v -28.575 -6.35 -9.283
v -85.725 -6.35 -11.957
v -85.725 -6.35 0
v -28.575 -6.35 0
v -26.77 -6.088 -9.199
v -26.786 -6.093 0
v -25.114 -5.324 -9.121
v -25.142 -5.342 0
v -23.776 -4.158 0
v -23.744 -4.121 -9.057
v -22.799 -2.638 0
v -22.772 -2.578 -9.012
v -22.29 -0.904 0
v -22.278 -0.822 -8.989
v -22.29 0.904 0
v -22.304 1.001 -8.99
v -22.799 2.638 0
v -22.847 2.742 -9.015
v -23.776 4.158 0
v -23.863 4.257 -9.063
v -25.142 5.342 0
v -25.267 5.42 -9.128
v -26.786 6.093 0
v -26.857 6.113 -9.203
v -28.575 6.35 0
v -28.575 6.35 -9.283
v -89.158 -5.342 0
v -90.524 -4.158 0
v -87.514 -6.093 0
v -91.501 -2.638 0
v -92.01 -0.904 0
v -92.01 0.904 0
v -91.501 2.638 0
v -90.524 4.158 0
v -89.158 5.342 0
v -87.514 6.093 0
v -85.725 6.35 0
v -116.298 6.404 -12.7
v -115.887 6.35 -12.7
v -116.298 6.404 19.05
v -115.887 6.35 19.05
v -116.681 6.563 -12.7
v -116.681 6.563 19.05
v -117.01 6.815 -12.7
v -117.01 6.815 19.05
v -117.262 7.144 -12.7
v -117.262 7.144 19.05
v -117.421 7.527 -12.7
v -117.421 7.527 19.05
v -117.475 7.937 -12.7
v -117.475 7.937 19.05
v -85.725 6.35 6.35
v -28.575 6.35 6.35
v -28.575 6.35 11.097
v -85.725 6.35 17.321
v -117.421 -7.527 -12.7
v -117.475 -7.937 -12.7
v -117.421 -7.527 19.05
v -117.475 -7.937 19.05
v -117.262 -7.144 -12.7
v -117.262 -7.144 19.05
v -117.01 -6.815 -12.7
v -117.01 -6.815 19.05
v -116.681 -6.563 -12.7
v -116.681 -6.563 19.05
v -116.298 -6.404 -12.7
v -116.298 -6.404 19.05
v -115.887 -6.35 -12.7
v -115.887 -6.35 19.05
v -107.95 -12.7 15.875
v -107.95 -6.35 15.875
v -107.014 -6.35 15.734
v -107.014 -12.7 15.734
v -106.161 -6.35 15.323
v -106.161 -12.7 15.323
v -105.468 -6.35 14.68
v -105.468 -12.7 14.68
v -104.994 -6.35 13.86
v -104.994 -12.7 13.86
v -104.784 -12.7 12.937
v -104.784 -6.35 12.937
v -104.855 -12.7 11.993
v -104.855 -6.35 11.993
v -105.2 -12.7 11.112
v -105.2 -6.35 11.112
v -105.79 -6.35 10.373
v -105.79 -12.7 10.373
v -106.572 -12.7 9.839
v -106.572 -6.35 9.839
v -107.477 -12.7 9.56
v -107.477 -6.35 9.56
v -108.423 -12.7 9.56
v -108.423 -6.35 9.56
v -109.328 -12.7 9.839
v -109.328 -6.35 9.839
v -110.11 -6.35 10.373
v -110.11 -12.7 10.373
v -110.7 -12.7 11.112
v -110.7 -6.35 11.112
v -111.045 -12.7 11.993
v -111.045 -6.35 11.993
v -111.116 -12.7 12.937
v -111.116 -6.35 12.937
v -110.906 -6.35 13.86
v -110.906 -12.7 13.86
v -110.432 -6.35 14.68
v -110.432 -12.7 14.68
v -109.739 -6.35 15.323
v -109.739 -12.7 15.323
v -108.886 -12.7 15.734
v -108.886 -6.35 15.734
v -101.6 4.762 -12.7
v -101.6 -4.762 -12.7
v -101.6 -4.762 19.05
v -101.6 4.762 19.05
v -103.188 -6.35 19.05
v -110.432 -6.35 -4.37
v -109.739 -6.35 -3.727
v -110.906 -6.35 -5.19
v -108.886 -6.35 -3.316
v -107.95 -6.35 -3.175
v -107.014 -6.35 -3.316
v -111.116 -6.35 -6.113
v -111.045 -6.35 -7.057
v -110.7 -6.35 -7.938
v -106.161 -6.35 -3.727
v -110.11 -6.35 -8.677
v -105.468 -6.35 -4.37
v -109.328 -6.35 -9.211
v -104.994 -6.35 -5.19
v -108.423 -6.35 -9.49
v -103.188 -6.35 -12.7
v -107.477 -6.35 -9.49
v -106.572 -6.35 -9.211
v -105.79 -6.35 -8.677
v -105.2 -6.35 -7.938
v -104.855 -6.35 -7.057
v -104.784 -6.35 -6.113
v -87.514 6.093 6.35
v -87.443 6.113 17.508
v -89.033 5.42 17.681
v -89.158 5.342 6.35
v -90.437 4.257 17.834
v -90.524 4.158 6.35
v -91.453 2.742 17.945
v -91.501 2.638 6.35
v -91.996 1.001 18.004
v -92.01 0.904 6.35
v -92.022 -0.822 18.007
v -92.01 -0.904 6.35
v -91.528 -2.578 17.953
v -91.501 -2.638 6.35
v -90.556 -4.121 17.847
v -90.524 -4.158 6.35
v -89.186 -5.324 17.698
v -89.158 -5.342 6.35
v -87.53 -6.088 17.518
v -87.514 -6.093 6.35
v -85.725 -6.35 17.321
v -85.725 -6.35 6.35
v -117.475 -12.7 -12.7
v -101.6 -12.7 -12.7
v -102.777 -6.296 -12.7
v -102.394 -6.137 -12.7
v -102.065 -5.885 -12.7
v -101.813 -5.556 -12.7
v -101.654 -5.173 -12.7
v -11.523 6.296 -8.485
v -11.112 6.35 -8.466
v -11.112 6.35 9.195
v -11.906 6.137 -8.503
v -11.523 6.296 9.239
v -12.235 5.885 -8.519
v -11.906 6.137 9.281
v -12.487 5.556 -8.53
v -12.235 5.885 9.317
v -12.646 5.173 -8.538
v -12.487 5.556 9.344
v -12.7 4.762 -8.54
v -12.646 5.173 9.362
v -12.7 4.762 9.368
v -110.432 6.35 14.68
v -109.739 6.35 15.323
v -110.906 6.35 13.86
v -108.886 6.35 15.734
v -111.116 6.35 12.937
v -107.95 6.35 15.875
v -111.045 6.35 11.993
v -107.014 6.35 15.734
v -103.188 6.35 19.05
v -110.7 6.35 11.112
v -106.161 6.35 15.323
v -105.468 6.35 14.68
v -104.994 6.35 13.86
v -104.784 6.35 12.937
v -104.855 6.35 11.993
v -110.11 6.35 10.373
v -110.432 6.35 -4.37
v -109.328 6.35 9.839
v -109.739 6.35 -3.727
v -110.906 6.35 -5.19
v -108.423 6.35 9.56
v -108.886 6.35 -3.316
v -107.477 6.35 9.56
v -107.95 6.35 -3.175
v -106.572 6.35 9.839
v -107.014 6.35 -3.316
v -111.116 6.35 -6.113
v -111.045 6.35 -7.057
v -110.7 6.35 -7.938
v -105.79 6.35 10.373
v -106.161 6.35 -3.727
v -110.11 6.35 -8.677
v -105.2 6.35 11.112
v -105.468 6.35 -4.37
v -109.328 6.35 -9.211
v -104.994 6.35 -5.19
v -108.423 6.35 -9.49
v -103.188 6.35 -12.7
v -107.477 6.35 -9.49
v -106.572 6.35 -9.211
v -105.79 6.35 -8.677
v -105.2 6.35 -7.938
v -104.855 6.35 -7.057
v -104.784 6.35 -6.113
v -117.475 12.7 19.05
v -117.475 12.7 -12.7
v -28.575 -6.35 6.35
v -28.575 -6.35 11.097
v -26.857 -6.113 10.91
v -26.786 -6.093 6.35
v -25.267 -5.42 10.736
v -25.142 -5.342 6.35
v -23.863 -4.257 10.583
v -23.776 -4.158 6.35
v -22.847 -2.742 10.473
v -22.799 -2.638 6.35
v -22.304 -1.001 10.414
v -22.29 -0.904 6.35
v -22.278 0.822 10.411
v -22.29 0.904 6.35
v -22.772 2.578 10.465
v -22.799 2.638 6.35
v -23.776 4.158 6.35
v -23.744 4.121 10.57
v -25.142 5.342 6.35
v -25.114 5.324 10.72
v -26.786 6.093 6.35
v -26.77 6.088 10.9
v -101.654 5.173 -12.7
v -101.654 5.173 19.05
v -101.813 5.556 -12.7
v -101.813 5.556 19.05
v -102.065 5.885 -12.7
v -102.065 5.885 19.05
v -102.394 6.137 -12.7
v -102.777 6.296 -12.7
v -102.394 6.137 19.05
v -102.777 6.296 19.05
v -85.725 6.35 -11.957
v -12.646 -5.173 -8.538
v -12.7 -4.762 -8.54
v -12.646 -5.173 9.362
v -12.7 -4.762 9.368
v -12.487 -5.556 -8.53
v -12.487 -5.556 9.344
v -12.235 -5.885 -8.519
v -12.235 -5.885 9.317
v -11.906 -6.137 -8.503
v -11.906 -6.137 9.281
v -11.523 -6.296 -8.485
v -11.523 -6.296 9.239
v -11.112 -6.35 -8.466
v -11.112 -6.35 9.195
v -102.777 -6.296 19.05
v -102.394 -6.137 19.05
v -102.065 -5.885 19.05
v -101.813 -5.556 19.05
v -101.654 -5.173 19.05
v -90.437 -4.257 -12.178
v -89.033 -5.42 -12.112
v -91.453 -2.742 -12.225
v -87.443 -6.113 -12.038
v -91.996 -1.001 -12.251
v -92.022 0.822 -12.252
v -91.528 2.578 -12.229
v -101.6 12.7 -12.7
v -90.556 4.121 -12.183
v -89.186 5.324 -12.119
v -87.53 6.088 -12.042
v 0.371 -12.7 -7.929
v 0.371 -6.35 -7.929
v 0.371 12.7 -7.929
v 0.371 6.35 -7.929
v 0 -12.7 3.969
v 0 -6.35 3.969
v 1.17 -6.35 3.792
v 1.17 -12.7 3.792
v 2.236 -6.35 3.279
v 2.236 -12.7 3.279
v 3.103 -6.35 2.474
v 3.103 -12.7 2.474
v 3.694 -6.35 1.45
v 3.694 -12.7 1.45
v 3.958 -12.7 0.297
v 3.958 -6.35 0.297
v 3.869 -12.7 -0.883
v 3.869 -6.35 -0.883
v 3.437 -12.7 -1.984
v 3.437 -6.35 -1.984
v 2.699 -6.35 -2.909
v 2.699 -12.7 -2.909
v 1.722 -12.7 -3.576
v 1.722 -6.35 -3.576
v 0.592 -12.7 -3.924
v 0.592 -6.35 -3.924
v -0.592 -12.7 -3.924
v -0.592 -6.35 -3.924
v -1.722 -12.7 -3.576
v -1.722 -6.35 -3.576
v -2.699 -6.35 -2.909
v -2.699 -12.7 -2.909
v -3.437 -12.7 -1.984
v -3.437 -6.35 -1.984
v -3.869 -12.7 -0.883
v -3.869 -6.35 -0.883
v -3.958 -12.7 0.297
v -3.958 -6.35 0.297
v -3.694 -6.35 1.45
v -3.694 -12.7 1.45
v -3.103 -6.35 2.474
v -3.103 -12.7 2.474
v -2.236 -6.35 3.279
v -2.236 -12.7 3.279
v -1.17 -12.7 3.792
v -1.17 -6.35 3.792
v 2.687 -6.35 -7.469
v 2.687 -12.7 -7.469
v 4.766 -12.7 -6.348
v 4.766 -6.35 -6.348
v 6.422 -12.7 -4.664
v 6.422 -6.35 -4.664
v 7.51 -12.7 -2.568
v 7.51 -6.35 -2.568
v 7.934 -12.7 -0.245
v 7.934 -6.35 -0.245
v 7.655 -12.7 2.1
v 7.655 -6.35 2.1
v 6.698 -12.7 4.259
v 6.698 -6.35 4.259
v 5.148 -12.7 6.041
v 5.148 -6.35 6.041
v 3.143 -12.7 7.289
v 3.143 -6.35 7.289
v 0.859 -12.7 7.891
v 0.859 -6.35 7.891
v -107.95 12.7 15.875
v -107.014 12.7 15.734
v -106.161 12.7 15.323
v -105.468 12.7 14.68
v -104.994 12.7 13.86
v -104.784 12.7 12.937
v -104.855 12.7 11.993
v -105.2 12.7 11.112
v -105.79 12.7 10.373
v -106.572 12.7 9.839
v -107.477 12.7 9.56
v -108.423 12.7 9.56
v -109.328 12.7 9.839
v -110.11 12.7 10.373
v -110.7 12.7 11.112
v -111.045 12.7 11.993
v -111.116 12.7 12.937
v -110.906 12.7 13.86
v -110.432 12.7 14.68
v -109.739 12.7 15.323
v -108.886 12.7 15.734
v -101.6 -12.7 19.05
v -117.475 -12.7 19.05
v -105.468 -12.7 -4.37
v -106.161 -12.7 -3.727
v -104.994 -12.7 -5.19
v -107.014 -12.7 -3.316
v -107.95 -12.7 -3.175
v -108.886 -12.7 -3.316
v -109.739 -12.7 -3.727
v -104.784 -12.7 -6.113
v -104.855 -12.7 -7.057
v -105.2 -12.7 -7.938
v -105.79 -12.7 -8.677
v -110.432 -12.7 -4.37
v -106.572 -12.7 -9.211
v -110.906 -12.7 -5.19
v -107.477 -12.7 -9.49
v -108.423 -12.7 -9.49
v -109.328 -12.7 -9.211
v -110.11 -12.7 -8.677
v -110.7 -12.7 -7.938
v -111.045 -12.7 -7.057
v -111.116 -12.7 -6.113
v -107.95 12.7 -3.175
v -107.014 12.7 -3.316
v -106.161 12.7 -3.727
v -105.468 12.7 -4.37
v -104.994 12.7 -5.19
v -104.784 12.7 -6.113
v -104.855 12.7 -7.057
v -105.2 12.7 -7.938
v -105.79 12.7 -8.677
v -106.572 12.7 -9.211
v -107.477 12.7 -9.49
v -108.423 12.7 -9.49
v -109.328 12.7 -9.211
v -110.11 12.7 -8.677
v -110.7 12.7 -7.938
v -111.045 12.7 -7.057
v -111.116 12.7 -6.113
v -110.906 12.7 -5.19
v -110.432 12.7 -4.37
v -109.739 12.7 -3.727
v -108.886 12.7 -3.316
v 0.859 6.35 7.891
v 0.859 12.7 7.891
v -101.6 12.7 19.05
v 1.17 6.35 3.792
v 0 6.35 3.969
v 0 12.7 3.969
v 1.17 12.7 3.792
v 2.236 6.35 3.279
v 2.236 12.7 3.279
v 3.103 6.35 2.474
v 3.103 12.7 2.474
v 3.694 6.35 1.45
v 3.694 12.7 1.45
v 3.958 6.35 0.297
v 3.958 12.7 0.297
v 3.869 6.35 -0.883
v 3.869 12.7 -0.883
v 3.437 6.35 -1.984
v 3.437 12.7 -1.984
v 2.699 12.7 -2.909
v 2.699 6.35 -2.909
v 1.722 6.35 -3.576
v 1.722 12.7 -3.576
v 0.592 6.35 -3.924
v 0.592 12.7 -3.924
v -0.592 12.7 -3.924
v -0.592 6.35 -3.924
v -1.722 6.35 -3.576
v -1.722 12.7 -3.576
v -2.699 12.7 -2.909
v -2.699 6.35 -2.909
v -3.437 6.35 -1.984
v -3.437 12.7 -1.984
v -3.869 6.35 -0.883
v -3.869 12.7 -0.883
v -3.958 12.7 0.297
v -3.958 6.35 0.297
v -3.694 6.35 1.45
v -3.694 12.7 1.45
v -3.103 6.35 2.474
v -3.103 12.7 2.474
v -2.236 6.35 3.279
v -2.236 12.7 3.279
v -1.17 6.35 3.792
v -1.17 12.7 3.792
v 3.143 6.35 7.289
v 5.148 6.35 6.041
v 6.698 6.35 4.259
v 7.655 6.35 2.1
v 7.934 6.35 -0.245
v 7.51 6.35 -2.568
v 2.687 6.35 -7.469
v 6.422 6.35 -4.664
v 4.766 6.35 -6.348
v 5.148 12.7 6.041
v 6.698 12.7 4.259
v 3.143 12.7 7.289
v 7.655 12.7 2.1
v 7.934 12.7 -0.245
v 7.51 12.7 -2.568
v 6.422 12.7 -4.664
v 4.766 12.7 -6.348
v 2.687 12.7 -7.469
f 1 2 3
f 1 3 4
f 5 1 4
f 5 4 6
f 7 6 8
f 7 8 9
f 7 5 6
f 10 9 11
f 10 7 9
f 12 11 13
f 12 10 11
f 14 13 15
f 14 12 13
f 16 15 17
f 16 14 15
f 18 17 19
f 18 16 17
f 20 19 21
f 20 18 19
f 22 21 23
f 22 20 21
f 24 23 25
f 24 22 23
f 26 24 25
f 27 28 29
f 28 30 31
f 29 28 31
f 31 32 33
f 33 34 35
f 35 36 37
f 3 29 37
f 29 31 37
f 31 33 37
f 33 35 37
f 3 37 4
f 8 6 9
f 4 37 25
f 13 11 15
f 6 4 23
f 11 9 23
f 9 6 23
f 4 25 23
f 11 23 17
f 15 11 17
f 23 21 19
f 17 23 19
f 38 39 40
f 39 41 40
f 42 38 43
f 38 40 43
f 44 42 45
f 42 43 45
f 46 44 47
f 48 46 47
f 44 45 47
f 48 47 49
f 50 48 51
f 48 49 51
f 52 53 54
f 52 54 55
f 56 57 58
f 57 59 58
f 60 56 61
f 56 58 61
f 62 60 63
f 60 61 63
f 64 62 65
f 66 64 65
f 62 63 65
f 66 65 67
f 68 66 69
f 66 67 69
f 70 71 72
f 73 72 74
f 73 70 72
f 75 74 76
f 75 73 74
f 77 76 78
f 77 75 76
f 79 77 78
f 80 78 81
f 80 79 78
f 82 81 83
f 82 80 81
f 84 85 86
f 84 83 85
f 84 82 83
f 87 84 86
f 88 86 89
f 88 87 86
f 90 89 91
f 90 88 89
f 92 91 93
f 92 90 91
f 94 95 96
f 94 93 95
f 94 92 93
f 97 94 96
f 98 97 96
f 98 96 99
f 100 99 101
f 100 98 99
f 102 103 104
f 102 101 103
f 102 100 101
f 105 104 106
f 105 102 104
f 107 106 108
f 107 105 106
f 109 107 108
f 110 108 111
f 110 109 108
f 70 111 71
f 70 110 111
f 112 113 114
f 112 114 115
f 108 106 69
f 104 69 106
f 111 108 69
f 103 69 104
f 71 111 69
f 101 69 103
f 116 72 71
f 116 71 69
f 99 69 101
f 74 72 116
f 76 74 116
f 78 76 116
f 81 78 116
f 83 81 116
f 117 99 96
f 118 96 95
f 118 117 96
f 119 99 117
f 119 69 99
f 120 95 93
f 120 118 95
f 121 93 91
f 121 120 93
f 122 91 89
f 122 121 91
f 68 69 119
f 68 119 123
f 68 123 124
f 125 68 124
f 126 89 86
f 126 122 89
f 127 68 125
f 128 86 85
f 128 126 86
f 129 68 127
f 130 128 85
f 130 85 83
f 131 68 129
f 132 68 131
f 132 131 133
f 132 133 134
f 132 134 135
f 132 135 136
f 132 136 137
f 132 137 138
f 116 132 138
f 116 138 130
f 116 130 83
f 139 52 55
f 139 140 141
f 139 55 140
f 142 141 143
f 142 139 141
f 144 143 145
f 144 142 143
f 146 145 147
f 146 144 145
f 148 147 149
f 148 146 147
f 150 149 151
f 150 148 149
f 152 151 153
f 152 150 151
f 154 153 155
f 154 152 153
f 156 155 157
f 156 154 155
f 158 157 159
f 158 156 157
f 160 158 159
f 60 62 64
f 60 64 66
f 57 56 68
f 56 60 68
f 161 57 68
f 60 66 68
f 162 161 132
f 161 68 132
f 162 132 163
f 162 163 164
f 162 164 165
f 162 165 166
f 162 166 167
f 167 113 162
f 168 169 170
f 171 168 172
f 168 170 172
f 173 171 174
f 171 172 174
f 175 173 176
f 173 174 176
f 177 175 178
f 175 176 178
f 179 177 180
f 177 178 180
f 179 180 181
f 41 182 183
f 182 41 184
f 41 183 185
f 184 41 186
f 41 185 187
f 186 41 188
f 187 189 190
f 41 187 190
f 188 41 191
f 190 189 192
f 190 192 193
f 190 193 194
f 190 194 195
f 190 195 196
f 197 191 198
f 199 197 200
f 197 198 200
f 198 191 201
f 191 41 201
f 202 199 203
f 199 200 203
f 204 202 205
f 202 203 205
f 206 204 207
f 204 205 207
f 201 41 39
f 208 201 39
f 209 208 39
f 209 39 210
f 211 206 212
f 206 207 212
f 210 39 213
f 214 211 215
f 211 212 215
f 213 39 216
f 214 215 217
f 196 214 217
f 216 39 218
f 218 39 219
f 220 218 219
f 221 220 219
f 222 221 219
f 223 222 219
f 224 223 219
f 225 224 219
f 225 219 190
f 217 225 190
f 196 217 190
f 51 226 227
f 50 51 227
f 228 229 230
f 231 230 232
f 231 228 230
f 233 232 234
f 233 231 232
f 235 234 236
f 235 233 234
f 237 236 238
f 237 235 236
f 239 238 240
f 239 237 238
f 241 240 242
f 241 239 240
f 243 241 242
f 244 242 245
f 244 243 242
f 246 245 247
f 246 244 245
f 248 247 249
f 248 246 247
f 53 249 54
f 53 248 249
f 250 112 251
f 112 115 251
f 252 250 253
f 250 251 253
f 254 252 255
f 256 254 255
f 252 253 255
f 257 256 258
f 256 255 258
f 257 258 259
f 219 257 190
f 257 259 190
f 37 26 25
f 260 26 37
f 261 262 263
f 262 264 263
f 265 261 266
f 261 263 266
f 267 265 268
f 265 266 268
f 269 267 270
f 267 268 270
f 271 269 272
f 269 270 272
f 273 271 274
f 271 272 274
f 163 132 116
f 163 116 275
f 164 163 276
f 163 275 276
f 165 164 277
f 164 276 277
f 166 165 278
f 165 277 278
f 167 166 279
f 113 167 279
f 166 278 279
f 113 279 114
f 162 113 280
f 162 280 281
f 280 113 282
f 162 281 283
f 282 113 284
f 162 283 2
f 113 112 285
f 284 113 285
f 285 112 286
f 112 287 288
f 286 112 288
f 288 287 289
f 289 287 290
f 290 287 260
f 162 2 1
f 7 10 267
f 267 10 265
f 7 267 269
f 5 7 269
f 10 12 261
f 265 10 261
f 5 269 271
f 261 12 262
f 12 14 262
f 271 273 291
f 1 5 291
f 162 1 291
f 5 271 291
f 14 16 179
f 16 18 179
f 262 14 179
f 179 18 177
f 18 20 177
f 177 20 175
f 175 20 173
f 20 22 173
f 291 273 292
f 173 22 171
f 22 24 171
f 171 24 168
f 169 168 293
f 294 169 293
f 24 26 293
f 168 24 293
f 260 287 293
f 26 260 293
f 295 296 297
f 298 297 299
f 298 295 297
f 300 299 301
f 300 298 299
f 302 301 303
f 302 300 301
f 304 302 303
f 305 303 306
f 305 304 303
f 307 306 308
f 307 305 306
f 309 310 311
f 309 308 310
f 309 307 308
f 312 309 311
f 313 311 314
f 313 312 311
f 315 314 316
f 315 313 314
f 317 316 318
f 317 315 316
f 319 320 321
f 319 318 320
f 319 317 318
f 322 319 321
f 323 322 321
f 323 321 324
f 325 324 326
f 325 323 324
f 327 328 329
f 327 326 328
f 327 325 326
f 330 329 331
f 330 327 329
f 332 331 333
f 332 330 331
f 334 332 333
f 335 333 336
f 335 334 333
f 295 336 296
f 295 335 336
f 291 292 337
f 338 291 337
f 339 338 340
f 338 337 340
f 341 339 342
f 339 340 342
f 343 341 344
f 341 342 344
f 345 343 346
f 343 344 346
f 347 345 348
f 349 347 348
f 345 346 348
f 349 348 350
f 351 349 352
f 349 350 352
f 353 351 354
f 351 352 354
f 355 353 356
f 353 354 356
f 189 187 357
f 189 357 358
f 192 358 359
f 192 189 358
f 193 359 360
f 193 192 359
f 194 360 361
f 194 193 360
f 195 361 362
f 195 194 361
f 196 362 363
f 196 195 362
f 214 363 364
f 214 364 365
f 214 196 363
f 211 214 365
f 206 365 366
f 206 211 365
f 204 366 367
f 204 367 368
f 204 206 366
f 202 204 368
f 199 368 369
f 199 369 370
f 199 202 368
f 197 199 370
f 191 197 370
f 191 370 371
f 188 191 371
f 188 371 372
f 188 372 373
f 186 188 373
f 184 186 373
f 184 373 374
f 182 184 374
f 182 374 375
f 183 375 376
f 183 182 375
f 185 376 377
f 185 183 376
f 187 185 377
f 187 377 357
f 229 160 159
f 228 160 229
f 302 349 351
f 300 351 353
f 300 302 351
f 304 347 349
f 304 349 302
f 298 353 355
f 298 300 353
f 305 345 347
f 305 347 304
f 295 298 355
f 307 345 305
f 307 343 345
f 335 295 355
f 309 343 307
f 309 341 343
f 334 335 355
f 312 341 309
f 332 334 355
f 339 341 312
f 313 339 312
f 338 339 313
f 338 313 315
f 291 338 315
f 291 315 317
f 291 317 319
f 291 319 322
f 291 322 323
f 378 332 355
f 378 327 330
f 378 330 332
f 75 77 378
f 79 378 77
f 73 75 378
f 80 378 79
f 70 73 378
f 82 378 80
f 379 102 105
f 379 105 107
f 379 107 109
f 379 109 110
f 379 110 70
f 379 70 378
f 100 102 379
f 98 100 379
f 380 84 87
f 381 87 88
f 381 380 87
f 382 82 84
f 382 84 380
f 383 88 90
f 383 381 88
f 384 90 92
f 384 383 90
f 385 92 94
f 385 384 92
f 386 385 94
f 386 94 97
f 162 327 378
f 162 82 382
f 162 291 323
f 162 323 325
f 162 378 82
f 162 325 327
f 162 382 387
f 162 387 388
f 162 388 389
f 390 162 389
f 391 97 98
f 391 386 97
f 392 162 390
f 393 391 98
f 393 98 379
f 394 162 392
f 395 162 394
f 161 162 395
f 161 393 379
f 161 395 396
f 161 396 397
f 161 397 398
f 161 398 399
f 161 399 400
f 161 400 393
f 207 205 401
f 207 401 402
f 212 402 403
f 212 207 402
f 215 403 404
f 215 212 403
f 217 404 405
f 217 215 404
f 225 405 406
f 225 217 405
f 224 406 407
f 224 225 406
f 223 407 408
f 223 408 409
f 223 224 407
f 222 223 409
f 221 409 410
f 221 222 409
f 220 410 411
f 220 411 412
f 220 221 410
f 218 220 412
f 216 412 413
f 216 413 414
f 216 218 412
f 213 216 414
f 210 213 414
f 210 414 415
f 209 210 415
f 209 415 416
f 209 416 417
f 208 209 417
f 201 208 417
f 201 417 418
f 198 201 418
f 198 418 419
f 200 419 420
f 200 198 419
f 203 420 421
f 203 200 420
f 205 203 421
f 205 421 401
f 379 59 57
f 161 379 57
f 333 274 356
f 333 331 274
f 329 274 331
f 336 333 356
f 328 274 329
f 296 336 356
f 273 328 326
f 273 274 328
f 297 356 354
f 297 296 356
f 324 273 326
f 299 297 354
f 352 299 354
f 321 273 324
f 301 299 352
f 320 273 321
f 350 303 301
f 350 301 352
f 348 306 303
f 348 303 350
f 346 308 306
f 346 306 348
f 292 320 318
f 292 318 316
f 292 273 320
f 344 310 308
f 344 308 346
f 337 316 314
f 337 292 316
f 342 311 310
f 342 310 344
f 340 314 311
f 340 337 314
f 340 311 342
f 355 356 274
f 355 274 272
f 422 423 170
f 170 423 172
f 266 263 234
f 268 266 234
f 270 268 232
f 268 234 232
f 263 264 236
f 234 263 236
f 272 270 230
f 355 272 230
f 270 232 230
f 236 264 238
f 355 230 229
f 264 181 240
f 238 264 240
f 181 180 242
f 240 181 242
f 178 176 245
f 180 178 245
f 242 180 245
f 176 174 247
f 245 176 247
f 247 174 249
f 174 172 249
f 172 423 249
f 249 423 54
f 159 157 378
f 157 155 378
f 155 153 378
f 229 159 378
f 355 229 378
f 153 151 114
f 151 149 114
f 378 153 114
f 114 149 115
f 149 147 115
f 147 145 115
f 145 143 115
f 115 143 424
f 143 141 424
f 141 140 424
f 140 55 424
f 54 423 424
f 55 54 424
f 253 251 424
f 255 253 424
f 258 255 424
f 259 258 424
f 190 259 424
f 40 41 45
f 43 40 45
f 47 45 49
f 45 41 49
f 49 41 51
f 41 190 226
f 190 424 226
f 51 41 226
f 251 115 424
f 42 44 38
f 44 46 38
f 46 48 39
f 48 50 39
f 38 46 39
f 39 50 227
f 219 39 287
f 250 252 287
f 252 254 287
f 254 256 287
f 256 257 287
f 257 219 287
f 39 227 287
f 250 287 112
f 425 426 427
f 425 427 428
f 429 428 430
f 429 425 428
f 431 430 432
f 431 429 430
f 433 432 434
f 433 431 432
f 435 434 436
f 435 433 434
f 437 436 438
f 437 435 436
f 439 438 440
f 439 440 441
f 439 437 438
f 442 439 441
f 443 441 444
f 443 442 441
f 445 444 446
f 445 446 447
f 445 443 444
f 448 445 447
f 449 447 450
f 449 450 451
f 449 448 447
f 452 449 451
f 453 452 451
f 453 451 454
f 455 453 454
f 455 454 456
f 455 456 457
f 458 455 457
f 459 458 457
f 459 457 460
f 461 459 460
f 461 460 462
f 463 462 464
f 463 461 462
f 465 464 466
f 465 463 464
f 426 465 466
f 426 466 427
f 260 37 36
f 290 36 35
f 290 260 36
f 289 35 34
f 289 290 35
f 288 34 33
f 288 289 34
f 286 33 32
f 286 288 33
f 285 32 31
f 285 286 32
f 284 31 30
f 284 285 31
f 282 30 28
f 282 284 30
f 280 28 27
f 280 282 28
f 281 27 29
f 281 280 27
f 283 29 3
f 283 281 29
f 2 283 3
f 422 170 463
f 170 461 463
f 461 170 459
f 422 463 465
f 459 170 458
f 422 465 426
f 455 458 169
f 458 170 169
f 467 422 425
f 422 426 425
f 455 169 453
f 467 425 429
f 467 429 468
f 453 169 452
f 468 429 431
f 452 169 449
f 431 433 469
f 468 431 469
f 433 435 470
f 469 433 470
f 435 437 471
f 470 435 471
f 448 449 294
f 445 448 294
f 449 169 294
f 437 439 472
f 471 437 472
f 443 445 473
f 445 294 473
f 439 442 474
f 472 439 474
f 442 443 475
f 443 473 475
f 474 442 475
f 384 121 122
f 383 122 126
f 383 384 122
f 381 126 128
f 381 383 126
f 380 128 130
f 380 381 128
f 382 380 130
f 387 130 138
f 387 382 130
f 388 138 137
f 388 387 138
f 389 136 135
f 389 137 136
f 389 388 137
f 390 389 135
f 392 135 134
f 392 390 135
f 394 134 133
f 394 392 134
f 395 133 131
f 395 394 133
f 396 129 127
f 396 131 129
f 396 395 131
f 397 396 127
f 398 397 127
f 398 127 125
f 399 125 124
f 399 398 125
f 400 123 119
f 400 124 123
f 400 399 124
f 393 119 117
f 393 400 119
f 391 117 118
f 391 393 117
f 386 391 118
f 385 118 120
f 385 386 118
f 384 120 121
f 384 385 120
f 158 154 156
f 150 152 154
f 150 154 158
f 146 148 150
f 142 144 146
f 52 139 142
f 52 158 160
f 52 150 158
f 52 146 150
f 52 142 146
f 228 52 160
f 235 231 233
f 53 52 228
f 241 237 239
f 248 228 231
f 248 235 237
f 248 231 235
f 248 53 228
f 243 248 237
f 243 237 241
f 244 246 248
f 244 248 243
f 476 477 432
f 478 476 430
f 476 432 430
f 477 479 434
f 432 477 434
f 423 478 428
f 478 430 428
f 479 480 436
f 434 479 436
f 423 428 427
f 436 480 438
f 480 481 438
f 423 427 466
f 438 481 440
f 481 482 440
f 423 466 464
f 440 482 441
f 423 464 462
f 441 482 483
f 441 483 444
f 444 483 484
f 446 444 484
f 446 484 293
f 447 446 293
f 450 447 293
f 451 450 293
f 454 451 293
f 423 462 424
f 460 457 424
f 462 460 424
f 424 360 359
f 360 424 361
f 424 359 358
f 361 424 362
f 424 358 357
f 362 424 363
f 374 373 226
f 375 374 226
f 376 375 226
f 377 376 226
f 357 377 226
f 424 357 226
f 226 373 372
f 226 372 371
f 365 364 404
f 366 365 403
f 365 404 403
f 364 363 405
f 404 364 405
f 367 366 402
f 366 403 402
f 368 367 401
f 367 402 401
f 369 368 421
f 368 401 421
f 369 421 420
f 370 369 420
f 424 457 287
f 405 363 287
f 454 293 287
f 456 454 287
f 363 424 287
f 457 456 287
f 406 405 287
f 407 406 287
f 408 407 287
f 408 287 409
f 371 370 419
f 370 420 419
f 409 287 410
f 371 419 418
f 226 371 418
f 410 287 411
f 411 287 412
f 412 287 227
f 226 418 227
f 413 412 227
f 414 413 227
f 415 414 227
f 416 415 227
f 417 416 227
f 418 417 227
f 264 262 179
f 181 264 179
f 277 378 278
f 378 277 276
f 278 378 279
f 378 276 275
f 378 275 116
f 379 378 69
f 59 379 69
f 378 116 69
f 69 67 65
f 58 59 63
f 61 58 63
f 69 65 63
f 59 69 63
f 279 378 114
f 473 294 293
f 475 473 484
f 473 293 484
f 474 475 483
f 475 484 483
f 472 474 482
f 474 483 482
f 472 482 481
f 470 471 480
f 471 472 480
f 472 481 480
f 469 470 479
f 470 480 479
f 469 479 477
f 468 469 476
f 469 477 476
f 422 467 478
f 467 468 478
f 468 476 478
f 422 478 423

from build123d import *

# Parameters (mm, degrees)
SKETCH1_R               = 3.96875
SKETCH1_R_2             = 3.175
BOSS_EXTRUDE1_DEPTH     = 12.7
CUT_EXTRUDE1_DEPTH      = 120.685287839
CUT_EXTRUDE1_DEPTH_BACK = 120.685287839
SKETCH2_W               = 25.4
SKETCH2_H               = 12.7
SKETCH2_W_2             = 19.05
FILLET1_R               = 1.5875
FILLET2_R               = 1.5875
CUT_EXTRUDE2_DEPTH      = 12.7
CUT_EXTRUDE3_START      = -12.7
CUT_EXTRUDE3_DEPTH      = 12.7


with BuildPart() as part:
    # Sketch1 → Boss-Extrude1 (new, symmetric)
    with BuildSketch(Plane(origin=(0, 0, 0), x_dir=(1, 0, 0), z_dir=(0, 1, 0))):
        with BuildLine():
            Line((-117.475, 12.7), (-101.6, 12.7))
            Line((-101.6, 12.7), (0.370986014, 7.928825615))
            ThreePointArc((0.370986014, 7.928825615), (7.933719481, 0.24495193), (0.859414796, -7.890837247))
            Line((0.859414796, -7.890837247), (-101.6, -19.05))
            Line((-101.6, -19.05), (-117.475, -19.05))
            Line((-117.475, -19.05), (-117.475, 12.7))
        make_face()
        with Locations(Location((0, 0, 0), (0, 0, 270))):
            Circle(SKETCH1_R, mode=Mode.SUBTRACT)
        with Locations(Location((-107.95, 6.35, 0), (0, 0, 270))):
            Circle(SKETCH1_R_2, mode=Mode.SUBTRACT)
        with Locations(Location((-107.95, -12.7, 0), (0, 0, 270))):
            Circle(SKETCH1_R_2, mode=Mode.SUBTRACT)
    extrude(amount=BOSS_EXTRUDE1_DEPTH, both=True)

    # Sketch2 → Cut-Extrude1 (cut, two sides: drawn at the far end of the back side and taken through both)
    with BuildSketch(Plane.XY.offset(-CUT_EXTRUDE1_DEPTH_BACK)):
        Rectangle(SKETCH2_W, SKETCH2_H)
        with Locations((-111.125, 0)):
            Rectangle(SKETCH2_W_2, SKETCH2_H)
    extrude(amount=CUT_EXTRUDE1_DEPTH + CUT_EXTRUDE1_DEPTH_BACK, mode=Mode.SUBTRACT)

    # Fillet1
    fillet1_edges = [part.edges().sort_by_distance(p)[0] for p in [
        (-12.7, -6.35, 0.413611484),
        (-12.7, 6.35, 0.413611484),
        (-101.6, -6.35, 3.175),
        (-101.6, 6.35, 3.175),
    ]]
    fillet(fillet1_edges, radius=FILLET1_R)

    # Fillet2
    fillet2_edges = [part.edges().sort_by_distance(p)[0] for p in [
        (-117.475, 6.35, 3.175),
        (-117.475, -6.35, 3.175),
    ]]
    fillet(fillet2_edges, radius=FILLET2_R)

    # Sketch3 → Cut-Extrude2 (cut)
    with BuildSketch(Plane(origin=(0, 0, -12.7), x_dir=(-1, 0, 0), z_dir=(0, 0, -1))):
        with BuildLine():
            Line((28.575, 6.35), (85.725, 6.35))
            ThreePointArc((85.725, 6.35), (92.075, 0), (85.725, -6.35))
            Line((85.725, -6.35), (28.575, -6.35))
            ThreePointArc((28.575, -6.35), (22.225, 0), (28.575, 6.35))
        make_face()
    extrude(amount=-CUT_EXTRUDE2_DEPTH, mode=Mode.SUBTRACT)

    # Sketch4 → Cut-Extrude3 (cut)
    with BuildSketch(Plane.XY.offset(19.05).offset(CUT_EXTRUDE3_START)):
        with BuildLine():
            Line((-28.575, 6.35), (-85.725, 6.35))
            ThreePointArc((-85.725, 6.35), (-92.075, 0), (-85.725, -6.35))
            Line((-85.725, -6.35), (-28.575, -6.35))
            ThreePointArc((-28.575, -6.35), (-22.225, 0), (-28.575, 6.35))
        make_face()
    extrude(amount=CUT_EXTRUDE3_DEPTH, mode=Mode.SUBTRACT)


solid = part.part
